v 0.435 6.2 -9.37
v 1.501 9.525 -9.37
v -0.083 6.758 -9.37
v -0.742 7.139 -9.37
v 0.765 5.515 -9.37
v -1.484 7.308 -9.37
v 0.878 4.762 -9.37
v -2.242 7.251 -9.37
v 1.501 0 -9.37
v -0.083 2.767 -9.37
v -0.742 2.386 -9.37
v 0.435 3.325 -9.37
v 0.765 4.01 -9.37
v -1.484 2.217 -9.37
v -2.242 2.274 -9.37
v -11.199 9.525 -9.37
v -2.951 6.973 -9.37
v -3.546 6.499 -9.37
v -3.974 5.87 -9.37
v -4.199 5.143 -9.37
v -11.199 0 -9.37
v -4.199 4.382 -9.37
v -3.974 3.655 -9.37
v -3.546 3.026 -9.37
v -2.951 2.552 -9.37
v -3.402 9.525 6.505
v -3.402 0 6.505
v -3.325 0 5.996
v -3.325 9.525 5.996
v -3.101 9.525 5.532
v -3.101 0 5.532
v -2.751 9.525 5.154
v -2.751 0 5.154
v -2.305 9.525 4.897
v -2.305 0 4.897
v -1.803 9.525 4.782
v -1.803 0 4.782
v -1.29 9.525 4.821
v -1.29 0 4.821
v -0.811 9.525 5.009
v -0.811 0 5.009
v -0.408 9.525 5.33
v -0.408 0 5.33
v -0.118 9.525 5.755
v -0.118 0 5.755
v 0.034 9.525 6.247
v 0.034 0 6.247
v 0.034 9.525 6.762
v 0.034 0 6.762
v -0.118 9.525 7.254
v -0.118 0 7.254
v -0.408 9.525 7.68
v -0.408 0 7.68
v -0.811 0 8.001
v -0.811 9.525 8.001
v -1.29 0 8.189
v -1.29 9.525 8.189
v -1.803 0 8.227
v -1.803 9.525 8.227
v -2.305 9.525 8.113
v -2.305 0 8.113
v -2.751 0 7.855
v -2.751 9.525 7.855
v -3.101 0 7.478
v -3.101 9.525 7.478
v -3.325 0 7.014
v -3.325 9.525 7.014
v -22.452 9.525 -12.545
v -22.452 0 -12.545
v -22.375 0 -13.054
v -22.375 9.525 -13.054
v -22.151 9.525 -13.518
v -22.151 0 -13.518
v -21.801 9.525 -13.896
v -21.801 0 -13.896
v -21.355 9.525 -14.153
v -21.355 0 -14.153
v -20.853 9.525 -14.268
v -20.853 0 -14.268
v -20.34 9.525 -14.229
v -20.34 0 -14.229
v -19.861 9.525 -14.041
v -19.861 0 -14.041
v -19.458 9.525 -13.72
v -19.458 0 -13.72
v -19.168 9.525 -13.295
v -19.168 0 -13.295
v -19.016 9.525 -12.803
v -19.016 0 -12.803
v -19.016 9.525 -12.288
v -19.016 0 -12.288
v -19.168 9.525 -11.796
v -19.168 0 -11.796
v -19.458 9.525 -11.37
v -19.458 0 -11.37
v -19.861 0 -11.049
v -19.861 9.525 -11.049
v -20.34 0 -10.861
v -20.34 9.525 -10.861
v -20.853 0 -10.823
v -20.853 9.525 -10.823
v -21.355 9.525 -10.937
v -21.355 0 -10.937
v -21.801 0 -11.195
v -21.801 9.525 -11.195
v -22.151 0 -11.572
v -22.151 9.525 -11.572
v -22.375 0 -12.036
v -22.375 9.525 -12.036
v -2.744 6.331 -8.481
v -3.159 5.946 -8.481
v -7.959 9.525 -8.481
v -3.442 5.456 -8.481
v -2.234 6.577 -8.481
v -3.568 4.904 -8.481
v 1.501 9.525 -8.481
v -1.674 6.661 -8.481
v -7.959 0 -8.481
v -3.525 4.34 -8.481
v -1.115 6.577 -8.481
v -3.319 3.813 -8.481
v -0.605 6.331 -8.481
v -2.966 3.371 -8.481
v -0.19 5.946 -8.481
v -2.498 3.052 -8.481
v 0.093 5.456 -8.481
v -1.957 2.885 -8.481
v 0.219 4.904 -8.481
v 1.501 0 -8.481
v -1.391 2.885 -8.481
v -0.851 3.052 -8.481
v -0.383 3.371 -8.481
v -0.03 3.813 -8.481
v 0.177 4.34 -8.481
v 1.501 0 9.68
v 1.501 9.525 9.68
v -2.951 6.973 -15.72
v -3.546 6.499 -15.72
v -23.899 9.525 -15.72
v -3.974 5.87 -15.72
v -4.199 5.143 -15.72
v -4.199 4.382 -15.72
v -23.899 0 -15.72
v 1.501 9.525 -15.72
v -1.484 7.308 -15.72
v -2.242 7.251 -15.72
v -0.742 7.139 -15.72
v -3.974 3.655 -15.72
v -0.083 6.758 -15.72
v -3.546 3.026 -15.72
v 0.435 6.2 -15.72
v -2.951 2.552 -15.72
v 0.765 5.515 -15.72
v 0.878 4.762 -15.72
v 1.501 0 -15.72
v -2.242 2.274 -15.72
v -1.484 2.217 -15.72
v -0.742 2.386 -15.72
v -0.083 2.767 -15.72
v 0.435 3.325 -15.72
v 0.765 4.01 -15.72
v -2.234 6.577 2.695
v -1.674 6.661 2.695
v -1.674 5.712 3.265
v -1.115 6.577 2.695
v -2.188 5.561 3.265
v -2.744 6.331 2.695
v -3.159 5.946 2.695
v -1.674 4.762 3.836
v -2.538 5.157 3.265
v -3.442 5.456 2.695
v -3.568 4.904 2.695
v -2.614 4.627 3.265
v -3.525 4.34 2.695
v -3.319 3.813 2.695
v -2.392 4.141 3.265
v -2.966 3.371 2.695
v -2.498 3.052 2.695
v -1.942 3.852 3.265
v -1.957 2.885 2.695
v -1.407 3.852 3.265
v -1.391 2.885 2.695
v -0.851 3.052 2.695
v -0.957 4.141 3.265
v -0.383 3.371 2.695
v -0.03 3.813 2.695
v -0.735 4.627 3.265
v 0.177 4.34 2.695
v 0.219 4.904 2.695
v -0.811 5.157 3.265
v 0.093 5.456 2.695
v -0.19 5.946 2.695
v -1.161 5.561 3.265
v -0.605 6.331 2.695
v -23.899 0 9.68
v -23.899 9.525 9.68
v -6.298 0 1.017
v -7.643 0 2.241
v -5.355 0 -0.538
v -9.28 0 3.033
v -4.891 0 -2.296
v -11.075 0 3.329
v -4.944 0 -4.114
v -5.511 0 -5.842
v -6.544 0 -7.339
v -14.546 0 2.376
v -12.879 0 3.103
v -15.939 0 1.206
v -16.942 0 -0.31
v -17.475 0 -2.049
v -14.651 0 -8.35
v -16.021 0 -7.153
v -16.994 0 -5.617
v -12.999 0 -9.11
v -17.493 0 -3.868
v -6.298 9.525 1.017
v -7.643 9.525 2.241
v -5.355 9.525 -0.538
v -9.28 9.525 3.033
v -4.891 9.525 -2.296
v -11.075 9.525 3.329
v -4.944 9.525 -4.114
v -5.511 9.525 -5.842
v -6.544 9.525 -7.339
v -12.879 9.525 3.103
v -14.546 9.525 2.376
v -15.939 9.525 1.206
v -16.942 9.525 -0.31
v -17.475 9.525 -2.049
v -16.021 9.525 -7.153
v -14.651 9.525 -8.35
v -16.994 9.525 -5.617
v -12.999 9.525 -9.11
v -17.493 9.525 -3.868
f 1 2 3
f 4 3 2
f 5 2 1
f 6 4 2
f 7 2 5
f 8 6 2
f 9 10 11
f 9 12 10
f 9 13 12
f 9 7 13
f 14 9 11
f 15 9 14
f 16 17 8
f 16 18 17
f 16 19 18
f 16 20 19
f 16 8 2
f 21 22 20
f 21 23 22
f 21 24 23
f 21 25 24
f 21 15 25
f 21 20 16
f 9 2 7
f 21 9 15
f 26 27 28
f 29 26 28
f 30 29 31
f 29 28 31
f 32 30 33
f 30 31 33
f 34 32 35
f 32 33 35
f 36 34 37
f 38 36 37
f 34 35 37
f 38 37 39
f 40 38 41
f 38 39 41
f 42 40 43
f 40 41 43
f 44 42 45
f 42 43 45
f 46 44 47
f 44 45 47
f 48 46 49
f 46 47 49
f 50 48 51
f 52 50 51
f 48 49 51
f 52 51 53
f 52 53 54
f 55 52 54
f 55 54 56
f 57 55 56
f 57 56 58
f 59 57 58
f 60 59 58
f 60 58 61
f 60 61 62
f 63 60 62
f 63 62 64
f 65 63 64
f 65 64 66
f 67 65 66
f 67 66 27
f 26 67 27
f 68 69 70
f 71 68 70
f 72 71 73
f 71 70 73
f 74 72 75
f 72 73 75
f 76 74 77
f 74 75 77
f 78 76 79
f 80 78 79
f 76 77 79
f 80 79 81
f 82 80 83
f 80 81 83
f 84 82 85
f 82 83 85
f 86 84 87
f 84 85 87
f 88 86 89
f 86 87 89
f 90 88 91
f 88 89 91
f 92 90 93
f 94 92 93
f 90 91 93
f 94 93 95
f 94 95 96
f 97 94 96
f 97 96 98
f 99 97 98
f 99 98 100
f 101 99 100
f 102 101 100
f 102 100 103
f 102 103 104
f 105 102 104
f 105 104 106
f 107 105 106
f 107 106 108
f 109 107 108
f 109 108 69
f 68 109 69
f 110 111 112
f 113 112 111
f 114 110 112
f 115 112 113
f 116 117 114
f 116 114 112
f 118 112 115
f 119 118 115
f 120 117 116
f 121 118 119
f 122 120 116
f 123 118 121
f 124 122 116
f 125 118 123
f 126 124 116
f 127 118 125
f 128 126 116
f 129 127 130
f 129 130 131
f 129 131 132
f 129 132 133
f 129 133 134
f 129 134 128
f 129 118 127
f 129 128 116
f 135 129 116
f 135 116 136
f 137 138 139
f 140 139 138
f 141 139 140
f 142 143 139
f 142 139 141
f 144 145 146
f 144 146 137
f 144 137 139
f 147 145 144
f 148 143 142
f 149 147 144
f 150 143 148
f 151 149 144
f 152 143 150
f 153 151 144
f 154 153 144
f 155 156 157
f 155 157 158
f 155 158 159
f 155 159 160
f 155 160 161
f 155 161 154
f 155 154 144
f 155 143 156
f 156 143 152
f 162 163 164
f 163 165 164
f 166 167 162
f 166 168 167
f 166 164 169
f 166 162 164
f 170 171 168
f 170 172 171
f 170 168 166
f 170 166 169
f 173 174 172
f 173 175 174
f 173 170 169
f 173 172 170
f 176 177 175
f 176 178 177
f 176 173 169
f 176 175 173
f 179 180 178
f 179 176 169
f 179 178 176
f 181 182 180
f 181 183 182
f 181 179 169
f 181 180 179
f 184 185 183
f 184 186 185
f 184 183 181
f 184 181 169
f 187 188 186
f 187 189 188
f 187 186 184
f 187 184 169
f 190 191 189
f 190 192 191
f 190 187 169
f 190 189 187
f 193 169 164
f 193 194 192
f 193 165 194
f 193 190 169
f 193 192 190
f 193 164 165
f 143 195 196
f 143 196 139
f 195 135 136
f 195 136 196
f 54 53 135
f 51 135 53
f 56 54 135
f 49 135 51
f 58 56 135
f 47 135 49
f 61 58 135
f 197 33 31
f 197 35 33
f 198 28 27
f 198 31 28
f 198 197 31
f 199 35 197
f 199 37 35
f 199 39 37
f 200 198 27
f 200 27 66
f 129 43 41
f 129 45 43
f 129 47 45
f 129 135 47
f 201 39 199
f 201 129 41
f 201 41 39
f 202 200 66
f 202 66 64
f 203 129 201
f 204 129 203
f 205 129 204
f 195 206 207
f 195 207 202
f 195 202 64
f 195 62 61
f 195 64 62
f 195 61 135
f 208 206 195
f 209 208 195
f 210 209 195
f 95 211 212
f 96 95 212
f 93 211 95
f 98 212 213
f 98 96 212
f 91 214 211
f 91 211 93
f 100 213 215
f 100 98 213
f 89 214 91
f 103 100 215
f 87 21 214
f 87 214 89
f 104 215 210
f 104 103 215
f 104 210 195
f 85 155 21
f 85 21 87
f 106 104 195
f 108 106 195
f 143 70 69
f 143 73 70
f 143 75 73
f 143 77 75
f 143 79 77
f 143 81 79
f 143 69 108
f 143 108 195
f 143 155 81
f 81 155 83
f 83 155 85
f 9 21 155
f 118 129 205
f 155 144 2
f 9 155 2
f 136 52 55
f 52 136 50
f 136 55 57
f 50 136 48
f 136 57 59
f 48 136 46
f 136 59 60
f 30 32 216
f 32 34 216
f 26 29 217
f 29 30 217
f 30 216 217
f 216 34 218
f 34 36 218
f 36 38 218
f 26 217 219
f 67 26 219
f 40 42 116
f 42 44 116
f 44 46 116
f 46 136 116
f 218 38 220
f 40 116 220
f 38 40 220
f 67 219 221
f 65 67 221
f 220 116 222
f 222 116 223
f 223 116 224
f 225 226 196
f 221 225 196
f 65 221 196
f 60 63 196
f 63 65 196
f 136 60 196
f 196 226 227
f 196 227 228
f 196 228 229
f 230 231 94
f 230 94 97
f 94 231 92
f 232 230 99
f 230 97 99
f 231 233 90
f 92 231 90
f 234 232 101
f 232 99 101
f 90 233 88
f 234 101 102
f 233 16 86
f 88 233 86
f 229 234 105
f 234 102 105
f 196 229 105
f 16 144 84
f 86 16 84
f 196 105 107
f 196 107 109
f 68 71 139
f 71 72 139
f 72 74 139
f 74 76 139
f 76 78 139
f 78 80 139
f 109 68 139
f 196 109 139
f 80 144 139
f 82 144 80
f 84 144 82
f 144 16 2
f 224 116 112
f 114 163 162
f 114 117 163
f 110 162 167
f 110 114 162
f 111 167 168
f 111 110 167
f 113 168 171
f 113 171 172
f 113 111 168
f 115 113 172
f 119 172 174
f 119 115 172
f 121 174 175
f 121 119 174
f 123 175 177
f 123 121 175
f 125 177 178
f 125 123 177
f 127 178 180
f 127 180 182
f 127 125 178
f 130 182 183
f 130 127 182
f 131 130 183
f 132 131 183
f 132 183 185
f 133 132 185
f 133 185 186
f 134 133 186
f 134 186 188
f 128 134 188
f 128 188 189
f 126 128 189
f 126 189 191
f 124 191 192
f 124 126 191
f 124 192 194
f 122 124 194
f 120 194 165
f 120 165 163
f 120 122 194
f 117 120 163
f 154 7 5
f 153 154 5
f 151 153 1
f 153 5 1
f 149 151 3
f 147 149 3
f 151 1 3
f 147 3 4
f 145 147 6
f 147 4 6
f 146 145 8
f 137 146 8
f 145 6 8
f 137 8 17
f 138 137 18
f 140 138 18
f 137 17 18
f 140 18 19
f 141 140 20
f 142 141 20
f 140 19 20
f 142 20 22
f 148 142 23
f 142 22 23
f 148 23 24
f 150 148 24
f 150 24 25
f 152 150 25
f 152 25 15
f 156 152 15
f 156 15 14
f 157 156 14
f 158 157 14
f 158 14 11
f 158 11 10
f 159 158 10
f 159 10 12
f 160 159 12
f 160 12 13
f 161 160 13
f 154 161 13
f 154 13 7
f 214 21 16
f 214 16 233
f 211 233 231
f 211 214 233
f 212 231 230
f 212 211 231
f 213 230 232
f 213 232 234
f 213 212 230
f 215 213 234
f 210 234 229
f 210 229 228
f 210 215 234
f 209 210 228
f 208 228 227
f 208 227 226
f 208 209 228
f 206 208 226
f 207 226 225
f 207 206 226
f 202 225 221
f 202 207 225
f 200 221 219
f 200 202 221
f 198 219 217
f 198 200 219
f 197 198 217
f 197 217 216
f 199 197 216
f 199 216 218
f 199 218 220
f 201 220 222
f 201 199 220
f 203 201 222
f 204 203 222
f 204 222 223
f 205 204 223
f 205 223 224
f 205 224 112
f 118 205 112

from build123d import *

# Parameters (mm, degrees)
BOSS_EXTRUDE1_DEPTH        = 9.525
F_8_32_TAPPED_HOLE1_D      = 3.4544
F_10_CLEARANCE_HOLE1_D     = 5.1054
F_10_CLEARANCE_HOLE1_DEPTH = 6.35


with BuildPart() as part:
    # Sketch1 → Boss-Extrude1 (new body)
    with BuildSketch(Plane(origin=(0, 0, 0), x_dir=(1, 0, 0), z_dir=(0, 1, 0))):
        with BuildLine():
            Line((1.500621967, 8.481252019), (1.500621967, -9.679747981))
            Line((1.500621967, -9.679747981), (-23.899378033, -9.679747981))
            Line((-23.899378033, -9.679747981), (-23.899378033, 15.720252019))
            Line((-23.899378033, 15.720252019), (1.500621967, 15.720252019))
            Line((1.500621967, 15.720252019), (1.500621967, 9.370252019))
            Line((1.500621967, 9.370252019), (-11.199378033, 9.370252019))
            ThreePointArc((-11.199378033, 9.370252019), (-12.879430115, -3.103466214), (-7.959010924, 8.481252019))
            Line((-7.959010924, 8.481252019), (1.500621967, 8.481252019))
        make_face()
    extrude(amount=BOSS_EXTRUDE1_DEPTH)

    # #8-32 Tapped Hole1 (through all)
    with Locations(Plane(origin=(0, 9.525, 0), x_dir=(1, 0, 0), z_dir=(0, 1, 0))):
        with Locations((-20.724378033, 12.545252019), (-1.674378033, -6.504747981)):
            Hole(F_8_32_TAPPED_HOLE1_D / 2)

    # Sketch4 → #10-24 Tapped Hole1 (revolve, cut)
    with BuildSketch(Plane(origin=(-1.674378033, 4.7625, -8.481252019), x_dir=(0, 1, 0), z_dir=(1, 0, 0))):
        Polygon((0, 0), (0, 12.316824014), (1.89865, 11.176), (1.89865, 0), align=None)
    revolve(axis=Axis((-1.674378033, 4.7625, -14.831252019), (0, 0, 1)), mode=Mode.SUBTRACT)

    # #10 Clearance Hole1
    with Locations(Plane(origin=(0, 0, -15.720252019), x_dir=(-1, 0, 0), z_dir=(0, 0, -1))):
        with Locations((1.674378033, 4.7625)):
            Hole(F_10_CLEARANCE_HOLE1_D / 2, depth=F_10_CLEARANCE_HOLE1_DEPTH)


solid = part.part
